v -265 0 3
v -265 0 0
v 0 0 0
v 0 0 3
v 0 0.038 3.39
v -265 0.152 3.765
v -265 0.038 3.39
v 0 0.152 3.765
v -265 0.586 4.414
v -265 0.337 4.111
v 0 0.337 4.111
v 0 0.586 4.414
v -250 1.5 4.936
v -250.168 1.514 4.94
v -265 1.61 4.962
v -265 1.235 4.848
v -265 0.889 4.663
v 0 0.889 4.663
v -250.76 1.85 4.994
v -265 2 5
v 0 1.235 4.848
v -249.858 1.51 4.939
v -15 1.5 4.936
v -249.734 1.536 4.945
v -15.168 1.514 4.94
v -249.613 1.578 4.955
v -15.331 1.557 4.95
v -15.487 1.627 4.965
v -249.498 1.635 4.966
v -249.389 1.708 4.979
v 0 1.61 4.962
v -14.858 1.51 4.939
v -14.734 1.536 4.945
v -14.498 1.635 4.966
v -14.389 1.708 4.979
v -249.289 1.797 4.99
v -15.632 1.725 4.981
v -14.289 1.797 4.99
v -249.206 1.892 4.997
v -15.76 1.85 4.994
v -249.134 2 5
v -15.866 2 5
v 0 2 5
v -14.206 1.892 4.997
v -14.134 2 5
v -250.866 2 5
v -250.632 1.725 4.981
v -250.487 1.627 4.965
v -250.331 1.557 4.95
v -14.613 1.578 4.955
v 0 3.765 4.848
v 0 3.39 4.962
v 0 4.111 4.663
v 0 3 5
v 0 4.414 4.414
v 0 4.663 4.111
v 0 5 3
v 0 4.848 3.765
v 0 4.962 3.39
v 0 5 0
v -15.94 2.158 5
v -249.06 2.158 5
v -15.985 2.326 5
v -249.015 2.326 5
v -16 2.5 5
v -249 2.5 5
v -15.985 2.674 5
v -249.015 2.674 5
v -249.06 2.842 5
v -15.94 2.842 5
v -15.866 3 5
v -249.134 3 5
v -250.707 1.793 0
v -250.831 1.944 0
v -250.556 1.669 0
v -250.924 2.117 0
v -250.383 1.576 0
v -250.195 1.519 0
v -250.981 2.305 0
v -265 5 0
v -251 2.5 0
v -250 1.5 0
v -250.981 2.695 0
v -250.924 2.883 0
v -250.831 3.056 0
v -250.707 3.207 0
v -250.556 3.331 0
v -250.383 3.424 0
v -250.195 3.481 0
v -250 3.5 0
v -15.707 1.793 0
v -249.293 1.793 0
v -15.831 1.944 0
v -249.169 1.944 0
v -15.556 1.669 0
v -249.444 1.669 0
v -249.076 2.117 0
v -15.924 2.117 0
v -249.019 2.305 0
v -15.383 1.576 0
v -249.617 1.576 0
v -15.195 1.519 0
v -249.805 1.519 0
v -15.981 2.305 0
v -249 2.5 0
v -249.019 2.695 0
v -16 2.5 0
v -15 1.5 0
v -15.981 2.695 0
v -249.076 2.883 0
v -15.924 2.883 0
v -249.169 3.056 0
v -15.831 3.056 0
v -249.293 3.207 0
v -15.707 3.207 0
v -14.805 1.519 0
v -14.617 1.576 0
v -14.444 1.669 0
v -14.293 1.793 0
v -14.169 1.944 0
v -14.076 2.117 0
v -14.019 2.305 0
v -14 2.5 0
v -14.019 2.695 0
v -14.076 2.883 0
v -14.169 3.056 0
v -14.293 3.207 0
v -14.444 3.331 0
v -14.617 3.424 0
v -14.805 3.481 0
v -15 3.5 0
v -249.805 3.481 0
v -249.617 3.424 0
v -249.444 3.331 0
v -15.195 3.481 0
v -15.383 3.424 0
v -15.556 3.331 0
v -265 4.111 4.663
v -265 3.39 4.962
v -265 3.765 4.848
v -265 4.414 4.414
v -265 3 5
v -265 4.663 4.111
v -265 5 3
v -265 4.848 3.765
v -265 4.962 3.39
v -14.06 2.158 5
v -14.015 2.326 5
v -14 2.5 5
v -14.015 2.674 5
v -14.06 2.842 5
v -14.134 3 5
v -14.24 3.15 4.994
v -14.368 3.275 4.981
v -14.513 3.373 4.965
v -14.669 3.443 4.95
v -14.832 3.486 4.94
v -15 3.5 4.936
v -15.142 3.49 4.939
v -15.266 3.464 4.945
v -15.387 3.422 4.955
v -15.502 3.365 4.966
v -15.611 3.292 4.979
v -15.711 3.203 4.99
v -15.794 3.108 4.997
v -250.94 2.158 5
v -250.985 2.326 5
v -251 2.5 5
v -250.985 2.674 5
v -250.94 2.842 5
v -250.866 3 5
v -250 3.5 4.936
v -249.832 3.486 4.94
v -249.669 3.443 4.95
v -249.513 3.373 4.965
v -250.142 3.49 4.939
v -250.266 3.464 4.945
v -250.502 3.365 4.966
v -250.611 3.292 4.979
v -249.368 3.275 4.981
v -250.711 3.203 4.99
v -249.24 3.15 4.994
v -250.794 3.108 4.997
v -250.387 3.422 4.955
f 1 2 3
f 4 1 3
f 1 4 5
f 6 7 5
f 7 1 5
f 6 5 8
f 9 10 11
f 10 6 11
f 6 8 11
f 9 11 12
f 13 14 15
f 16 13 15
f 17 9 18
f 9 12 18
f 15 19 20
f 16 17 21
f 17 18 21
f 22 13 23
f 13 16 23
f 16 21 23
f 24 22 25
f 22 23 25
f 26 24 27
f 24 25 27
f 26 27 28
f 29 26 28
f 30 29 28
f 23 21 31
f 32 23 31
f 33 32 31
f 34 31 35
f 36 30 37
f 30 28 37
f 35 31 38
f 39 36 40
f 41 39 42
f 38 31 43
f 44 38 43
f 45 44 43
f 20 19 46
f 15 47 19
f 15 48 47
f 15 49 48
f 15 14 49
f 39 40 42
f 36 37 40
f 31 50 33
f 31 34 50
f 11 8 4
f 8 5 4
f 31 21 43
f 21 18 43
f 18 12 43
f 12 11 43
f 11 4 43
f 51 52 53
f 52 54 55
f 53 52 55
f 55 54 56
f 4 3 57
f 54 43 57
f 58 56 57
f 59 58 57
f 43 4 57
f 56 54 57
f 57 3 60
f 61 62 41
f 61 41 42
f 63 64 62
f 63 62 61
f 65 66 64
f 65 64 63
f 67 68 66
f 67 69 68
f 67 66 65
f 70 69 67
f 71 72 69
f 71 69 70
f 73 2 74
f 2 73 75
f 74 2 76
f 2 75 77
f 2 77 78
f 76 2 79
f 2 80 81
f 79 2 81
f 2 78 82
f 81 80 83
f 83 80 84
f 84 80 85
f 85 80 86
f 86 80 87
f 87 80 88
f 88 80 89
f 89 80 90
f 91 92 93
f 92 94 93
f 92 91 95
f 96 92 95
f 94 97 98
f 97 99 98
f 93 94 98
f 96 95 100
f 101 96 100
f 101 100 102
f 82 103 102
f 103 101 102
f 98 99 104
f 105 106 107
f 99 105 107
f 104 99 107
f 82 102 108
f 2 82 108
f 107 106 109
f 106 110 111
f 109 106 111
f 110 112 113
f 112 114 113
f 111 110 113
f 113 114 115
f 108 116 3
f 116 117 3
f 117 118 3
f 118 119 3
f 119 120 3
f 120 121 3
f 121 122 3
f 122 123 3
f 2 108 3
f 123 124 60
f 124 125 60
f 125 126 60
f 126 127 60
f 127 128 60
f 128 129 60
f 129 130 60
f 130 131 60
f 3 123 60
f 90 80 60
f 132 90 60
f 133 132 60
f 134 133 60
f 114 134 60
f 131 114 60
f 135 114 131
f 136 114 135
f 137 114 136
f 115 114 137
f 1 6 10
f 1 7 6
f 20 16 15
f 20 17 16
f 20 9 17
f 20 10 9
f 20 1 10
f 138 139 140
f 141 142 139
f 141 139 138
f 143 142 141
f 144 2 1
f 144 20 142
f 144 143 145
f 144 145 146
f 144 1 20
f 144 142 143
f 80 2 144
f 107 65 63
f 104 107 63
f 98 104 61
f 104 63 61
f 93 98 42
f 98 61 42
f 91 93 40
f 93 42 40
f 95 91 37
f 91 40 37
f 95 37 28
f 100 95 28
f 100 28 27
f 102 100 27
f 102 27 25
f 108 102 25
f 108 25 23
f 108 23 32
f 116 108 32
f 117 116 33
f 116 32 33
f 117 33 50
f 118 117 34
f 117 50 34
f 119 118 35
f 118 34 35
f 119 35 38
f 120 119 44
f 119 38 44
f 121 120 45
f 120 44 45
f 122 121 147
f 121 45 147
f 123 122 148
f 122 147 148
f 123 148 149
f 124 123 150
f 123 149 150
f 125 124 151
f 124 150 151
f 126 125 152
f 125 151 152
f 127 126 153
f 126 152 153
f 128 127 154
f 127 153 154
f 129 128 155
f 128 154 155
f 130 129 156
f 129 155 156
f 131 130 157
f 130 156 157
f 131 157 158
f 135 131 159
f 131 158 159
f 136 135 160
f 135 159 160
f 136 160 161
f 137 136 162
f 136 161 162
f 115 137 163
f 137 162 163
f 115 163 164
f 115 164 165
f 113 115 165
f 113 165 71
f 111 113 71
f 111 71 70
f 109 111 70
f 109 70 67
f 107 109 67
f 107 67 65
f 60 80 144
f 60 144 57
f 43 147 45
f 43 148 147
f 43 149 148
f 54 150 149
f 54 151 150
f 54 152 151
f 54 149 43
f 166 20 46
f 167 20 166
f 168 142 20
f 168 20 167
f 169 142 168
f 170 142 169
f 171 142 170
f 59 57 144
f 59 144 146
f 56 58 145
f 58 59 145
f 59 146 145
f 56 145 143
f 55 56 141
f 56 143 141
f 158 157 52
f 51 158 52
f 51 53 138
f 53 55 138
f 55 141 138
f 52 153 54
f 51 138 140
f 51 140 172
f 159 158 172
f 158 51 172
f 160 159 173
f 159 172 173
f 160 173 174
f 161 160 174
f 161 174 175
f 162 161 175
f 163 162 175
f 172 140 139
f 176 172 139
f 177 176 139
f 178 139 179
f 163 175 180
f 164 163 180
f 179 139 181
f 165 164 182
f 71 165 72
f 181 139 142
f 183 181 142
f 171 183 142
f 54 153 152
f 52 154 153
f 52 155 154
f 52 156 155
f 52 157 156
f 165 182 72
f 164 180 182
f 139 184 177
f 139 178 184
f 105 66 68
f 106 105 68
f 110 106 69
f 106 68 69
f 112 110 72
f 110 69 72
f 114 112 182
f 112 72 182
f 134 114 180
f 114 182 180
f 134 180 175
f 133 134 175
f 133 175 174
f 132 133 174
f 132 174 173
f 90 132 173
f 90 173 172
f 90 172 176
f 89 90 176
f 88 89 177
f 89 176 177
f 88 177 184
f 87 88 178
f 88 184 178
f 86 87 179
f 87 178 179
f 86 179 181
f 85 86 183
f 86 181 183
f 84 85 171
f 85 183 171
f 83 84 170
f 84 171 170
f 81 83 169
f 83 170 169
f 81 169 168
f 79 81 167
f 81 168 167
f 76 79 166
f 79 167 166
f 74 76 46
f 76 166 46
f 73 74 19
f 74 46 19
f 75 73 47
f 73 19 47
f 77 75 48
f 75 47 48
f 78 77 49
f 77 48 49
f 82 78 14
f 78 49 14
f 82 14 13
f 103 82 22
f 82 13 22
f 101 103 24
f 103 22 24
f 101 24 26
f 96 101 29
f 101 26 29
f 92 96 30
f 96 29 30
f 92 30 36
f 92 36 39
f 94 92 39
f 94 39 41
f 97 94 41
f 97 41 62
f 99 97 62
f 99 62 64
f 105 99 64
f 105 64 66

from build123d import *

# Parameters (mm, degrees)
SKETCH1_W           = 265
SKETCH1_H           = 5
BOSS_EXTRUDE1_DEPTH = 5
SKETCH2_R           = 1
CUT_EXTRUDE1_DEPTH  = 266.094322836
FILLET1_R           = 2


with BuildPart() as part:
    # Sketch1 → Boss-Extrude1 (new body)
    with BuildSketch(Plane.XY):
        with Locations((-132.5, 2.5)):
            Rectangle(SKETCH1_W, SKETCH1_H)
    extrude(amount=BOSS_EXTRUDE1_DEPTH)

    # Sketch2 → Cut-Extrude1 (cut, through all)
    with BuildSketch(Plane.XY.offset(5)):
        with Locations((-250, 2.5)):
            Circle(SKETCH2_R)
        with Locations(Location((-15, 2.5, 0), (0, 0, 180))):
            Circle(SKETCH2_R)
    extrude(amount=-CUT_EXTRUDE1_DEPTH, mode=Mode.SUBTRACT)

    # Fillet1
    # the kernel refuses this fillet: 2 mm, written as the material it takes off along each edge
    with BuildSketch(Plane(origin=(5, 0, 5), x_dir=(0, 0, -1), z_dir=(-1, 0, 0))) as fillet1_piece_1:
        with BuildLine():
            CenterArc((FILLET1_R, -FILLET1_R), FILLET1_R, 90, 90)
            Line((0, -FILLET1_R), (0, 0))
            Line((0, 0), (FILLET1_R, 0))
        make_face()
    extrude(amount=275, mode=Mode.SUBTRACT)
    with BuildSketch(Plane(origin=(-270, 5, 5), x_dir=(0, -1, 0), z_dir=(1, 0, 0))) as fillet1_piece_2:
        with BuildLine():
            CenterArc((FILLET1_R, FILLET1_R), FILLET1_R, 180, 90)
            Line((0, FILLET1_R), (0, 0))
            Line((0, 0), (FILLET1_R, 0))
        make_face()
    extrude(amount=275, mode=Mode.SUBTRACT)


solid = part.part
